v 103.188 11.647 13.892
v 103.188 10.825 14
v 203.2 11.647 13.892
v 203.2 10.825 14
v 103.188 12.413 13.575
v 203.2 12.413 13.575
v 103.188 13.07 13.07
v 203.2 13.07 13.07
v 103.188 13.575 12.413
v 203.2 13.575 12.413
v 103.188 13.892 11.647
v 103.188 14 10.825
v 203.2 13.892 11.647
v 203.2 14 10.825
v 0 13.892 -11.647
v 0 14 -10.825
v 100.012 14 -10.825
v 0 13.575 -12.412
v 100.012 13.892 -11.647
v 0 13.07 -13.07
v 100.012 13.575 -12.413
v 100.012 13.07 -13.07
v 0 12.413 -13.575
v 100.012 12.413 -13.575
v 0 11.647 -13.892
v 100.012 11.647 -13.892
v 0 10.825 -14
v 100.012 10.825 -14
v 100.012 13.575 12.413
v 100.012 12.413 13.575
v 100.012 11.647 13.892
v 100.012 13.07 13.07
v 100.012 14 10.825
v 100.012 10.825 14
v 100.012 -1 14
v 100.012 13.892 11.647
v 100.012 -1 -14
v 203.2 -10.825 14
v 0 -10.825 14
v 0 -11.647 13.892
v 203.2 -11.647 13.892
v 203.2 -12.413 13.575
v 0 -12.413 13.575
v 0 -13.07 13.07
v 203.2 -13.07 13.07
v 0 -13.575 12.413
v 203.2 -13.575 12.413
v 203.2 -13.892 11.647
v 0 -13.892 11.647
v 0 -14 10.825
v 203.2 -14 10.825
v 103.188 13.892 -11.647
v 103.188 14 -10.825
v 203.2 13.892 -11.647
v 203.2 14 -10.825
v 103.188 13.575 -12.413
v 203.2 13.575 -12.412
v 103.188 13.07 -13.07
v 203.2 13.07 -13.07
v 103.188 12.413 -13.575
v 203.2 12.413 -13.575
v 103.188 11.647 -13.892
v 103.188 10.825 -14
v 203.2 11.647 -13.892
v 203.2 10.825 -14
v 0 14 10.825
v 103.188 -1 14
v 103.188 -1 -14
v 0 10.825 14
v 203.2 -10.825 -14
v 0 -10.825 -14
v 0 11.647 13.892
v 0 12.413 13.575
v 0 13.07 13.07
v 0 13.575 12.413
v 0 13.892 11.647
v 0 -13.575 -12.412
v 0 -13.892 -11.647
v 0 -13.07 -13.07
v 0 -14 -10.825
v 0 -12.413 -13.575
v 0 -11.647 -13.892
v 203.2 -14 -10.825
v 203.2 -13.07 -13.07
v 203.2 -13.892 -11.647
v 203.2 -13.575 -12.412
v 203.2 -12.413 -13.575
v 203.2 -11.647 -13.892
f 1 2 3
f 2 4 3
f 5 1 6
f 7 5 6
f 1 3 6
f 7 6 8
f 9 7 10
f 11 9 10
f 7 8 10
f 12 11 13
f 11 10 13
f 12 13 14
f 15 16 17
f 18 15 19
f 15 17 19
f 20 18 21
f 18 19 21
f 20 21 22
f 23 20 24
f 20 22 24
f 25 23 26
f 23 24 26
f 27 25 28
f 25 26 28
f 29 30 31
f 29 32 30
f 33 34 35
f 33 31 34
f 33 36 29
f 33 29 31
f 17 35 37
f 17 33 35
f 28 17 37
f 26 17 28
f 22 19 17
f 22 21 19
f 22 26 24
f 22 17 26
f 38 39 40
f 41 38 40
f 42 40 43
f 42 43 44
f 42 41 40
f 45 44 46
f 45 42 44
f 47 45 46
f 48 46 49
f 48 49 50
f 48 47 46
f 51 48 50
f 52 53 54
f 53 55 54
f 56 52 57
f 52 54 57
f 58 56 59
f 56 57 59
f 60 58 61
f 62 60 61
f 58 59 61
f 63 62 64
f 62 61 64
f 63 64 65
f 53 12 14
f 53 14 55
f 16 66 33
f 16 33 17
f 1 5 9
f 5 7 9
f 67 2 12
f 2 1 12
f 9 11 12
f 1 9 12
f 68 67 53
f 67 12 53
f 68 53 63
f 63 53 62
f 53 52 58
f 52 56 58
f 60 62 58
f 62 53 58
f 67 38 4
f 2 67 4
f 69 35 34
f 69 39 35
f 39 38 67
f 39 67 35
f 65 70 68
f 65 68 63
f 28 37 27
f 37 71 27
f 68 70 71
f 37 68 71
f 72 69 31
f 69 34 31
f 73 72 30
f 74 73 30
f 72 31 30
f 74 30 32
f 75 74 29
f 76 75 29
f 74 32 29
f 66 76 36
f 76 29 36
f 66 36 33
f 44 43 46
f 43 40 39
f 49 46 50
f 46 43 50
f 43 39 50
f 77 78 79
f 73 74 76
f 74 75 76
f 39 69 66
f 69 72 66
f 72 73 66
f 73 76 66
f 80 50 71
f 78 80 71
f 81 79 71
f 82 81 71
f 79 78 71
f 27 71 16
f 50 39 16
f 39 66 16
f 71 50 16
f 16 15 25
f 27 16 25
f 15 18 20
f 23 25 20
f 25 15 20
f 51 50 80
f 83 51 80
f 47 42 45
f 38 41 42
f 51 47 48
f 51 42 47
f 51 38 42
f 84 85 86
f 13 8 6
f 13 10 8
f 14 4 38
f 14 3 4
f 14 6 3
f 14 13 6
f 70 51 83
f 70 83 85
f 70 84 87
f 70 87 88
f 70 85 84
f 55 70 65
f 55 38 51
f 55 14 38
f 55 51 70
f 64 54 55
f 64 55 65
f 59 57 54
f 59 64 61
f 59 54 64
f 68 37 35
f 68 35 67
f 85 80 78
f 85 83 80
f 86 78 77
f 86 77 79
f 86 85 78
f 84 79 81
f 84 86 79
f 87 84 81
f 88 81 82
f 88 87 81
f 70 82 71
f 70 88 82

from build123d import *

# Parameters (mm, degrees)
SKETCH1_W           = 28
SKETCH1_H           = 28
BOSS_EXTRUDE1_DEPTH = 203.2
SKETCH2_W           = 3.175
SKETCH2_H           = 28
CUT_EXTRUDE1_DEPTH  = 15
FILLET1_R           = 3.175


with BuildPart() as part:
    # Sketch1 → Boss-Extrude1 (new body)
    with BuildSketch(Plane(origin=(0, 0, 0), x_dir=(0, 0, -1), z_dir=(1, 0, 0))):
        Rectangle(SKETCH1_W, SKETCH1_H)
    extrude(amount=BOSS_EXTRUDE1_DEPTH)

    # Sketch2 → Cut-Extrude1 (cut)
    with BuildSketch(Plane(origin=(0, 14, 0), x_dir=(1, 0, 0), z_dir=(0, 1, 0))):
        with Locations((101.6, 0)):
            Rectangle(SKETCH2_W, SKETCH2_H)
    extrude(amount=-CUT_EXTRUDE1_DEPTH, mode=Mode.SUBTRACT)

    # Fillet1
    fillet1_edges = [part.edges().sort_by_distance(p)[0] for p in [
        (50.00625, 14, 14),
        (50.00625, 14, -14),
        (153.19375, 14, 14),
        (153.19375, 14, -14),
        (101.6, -14, -14),
        (101.6, -14, 14),
    ]]
    fillet(fillet1_edges, radius=FILLET1_R)


solid = part.part
